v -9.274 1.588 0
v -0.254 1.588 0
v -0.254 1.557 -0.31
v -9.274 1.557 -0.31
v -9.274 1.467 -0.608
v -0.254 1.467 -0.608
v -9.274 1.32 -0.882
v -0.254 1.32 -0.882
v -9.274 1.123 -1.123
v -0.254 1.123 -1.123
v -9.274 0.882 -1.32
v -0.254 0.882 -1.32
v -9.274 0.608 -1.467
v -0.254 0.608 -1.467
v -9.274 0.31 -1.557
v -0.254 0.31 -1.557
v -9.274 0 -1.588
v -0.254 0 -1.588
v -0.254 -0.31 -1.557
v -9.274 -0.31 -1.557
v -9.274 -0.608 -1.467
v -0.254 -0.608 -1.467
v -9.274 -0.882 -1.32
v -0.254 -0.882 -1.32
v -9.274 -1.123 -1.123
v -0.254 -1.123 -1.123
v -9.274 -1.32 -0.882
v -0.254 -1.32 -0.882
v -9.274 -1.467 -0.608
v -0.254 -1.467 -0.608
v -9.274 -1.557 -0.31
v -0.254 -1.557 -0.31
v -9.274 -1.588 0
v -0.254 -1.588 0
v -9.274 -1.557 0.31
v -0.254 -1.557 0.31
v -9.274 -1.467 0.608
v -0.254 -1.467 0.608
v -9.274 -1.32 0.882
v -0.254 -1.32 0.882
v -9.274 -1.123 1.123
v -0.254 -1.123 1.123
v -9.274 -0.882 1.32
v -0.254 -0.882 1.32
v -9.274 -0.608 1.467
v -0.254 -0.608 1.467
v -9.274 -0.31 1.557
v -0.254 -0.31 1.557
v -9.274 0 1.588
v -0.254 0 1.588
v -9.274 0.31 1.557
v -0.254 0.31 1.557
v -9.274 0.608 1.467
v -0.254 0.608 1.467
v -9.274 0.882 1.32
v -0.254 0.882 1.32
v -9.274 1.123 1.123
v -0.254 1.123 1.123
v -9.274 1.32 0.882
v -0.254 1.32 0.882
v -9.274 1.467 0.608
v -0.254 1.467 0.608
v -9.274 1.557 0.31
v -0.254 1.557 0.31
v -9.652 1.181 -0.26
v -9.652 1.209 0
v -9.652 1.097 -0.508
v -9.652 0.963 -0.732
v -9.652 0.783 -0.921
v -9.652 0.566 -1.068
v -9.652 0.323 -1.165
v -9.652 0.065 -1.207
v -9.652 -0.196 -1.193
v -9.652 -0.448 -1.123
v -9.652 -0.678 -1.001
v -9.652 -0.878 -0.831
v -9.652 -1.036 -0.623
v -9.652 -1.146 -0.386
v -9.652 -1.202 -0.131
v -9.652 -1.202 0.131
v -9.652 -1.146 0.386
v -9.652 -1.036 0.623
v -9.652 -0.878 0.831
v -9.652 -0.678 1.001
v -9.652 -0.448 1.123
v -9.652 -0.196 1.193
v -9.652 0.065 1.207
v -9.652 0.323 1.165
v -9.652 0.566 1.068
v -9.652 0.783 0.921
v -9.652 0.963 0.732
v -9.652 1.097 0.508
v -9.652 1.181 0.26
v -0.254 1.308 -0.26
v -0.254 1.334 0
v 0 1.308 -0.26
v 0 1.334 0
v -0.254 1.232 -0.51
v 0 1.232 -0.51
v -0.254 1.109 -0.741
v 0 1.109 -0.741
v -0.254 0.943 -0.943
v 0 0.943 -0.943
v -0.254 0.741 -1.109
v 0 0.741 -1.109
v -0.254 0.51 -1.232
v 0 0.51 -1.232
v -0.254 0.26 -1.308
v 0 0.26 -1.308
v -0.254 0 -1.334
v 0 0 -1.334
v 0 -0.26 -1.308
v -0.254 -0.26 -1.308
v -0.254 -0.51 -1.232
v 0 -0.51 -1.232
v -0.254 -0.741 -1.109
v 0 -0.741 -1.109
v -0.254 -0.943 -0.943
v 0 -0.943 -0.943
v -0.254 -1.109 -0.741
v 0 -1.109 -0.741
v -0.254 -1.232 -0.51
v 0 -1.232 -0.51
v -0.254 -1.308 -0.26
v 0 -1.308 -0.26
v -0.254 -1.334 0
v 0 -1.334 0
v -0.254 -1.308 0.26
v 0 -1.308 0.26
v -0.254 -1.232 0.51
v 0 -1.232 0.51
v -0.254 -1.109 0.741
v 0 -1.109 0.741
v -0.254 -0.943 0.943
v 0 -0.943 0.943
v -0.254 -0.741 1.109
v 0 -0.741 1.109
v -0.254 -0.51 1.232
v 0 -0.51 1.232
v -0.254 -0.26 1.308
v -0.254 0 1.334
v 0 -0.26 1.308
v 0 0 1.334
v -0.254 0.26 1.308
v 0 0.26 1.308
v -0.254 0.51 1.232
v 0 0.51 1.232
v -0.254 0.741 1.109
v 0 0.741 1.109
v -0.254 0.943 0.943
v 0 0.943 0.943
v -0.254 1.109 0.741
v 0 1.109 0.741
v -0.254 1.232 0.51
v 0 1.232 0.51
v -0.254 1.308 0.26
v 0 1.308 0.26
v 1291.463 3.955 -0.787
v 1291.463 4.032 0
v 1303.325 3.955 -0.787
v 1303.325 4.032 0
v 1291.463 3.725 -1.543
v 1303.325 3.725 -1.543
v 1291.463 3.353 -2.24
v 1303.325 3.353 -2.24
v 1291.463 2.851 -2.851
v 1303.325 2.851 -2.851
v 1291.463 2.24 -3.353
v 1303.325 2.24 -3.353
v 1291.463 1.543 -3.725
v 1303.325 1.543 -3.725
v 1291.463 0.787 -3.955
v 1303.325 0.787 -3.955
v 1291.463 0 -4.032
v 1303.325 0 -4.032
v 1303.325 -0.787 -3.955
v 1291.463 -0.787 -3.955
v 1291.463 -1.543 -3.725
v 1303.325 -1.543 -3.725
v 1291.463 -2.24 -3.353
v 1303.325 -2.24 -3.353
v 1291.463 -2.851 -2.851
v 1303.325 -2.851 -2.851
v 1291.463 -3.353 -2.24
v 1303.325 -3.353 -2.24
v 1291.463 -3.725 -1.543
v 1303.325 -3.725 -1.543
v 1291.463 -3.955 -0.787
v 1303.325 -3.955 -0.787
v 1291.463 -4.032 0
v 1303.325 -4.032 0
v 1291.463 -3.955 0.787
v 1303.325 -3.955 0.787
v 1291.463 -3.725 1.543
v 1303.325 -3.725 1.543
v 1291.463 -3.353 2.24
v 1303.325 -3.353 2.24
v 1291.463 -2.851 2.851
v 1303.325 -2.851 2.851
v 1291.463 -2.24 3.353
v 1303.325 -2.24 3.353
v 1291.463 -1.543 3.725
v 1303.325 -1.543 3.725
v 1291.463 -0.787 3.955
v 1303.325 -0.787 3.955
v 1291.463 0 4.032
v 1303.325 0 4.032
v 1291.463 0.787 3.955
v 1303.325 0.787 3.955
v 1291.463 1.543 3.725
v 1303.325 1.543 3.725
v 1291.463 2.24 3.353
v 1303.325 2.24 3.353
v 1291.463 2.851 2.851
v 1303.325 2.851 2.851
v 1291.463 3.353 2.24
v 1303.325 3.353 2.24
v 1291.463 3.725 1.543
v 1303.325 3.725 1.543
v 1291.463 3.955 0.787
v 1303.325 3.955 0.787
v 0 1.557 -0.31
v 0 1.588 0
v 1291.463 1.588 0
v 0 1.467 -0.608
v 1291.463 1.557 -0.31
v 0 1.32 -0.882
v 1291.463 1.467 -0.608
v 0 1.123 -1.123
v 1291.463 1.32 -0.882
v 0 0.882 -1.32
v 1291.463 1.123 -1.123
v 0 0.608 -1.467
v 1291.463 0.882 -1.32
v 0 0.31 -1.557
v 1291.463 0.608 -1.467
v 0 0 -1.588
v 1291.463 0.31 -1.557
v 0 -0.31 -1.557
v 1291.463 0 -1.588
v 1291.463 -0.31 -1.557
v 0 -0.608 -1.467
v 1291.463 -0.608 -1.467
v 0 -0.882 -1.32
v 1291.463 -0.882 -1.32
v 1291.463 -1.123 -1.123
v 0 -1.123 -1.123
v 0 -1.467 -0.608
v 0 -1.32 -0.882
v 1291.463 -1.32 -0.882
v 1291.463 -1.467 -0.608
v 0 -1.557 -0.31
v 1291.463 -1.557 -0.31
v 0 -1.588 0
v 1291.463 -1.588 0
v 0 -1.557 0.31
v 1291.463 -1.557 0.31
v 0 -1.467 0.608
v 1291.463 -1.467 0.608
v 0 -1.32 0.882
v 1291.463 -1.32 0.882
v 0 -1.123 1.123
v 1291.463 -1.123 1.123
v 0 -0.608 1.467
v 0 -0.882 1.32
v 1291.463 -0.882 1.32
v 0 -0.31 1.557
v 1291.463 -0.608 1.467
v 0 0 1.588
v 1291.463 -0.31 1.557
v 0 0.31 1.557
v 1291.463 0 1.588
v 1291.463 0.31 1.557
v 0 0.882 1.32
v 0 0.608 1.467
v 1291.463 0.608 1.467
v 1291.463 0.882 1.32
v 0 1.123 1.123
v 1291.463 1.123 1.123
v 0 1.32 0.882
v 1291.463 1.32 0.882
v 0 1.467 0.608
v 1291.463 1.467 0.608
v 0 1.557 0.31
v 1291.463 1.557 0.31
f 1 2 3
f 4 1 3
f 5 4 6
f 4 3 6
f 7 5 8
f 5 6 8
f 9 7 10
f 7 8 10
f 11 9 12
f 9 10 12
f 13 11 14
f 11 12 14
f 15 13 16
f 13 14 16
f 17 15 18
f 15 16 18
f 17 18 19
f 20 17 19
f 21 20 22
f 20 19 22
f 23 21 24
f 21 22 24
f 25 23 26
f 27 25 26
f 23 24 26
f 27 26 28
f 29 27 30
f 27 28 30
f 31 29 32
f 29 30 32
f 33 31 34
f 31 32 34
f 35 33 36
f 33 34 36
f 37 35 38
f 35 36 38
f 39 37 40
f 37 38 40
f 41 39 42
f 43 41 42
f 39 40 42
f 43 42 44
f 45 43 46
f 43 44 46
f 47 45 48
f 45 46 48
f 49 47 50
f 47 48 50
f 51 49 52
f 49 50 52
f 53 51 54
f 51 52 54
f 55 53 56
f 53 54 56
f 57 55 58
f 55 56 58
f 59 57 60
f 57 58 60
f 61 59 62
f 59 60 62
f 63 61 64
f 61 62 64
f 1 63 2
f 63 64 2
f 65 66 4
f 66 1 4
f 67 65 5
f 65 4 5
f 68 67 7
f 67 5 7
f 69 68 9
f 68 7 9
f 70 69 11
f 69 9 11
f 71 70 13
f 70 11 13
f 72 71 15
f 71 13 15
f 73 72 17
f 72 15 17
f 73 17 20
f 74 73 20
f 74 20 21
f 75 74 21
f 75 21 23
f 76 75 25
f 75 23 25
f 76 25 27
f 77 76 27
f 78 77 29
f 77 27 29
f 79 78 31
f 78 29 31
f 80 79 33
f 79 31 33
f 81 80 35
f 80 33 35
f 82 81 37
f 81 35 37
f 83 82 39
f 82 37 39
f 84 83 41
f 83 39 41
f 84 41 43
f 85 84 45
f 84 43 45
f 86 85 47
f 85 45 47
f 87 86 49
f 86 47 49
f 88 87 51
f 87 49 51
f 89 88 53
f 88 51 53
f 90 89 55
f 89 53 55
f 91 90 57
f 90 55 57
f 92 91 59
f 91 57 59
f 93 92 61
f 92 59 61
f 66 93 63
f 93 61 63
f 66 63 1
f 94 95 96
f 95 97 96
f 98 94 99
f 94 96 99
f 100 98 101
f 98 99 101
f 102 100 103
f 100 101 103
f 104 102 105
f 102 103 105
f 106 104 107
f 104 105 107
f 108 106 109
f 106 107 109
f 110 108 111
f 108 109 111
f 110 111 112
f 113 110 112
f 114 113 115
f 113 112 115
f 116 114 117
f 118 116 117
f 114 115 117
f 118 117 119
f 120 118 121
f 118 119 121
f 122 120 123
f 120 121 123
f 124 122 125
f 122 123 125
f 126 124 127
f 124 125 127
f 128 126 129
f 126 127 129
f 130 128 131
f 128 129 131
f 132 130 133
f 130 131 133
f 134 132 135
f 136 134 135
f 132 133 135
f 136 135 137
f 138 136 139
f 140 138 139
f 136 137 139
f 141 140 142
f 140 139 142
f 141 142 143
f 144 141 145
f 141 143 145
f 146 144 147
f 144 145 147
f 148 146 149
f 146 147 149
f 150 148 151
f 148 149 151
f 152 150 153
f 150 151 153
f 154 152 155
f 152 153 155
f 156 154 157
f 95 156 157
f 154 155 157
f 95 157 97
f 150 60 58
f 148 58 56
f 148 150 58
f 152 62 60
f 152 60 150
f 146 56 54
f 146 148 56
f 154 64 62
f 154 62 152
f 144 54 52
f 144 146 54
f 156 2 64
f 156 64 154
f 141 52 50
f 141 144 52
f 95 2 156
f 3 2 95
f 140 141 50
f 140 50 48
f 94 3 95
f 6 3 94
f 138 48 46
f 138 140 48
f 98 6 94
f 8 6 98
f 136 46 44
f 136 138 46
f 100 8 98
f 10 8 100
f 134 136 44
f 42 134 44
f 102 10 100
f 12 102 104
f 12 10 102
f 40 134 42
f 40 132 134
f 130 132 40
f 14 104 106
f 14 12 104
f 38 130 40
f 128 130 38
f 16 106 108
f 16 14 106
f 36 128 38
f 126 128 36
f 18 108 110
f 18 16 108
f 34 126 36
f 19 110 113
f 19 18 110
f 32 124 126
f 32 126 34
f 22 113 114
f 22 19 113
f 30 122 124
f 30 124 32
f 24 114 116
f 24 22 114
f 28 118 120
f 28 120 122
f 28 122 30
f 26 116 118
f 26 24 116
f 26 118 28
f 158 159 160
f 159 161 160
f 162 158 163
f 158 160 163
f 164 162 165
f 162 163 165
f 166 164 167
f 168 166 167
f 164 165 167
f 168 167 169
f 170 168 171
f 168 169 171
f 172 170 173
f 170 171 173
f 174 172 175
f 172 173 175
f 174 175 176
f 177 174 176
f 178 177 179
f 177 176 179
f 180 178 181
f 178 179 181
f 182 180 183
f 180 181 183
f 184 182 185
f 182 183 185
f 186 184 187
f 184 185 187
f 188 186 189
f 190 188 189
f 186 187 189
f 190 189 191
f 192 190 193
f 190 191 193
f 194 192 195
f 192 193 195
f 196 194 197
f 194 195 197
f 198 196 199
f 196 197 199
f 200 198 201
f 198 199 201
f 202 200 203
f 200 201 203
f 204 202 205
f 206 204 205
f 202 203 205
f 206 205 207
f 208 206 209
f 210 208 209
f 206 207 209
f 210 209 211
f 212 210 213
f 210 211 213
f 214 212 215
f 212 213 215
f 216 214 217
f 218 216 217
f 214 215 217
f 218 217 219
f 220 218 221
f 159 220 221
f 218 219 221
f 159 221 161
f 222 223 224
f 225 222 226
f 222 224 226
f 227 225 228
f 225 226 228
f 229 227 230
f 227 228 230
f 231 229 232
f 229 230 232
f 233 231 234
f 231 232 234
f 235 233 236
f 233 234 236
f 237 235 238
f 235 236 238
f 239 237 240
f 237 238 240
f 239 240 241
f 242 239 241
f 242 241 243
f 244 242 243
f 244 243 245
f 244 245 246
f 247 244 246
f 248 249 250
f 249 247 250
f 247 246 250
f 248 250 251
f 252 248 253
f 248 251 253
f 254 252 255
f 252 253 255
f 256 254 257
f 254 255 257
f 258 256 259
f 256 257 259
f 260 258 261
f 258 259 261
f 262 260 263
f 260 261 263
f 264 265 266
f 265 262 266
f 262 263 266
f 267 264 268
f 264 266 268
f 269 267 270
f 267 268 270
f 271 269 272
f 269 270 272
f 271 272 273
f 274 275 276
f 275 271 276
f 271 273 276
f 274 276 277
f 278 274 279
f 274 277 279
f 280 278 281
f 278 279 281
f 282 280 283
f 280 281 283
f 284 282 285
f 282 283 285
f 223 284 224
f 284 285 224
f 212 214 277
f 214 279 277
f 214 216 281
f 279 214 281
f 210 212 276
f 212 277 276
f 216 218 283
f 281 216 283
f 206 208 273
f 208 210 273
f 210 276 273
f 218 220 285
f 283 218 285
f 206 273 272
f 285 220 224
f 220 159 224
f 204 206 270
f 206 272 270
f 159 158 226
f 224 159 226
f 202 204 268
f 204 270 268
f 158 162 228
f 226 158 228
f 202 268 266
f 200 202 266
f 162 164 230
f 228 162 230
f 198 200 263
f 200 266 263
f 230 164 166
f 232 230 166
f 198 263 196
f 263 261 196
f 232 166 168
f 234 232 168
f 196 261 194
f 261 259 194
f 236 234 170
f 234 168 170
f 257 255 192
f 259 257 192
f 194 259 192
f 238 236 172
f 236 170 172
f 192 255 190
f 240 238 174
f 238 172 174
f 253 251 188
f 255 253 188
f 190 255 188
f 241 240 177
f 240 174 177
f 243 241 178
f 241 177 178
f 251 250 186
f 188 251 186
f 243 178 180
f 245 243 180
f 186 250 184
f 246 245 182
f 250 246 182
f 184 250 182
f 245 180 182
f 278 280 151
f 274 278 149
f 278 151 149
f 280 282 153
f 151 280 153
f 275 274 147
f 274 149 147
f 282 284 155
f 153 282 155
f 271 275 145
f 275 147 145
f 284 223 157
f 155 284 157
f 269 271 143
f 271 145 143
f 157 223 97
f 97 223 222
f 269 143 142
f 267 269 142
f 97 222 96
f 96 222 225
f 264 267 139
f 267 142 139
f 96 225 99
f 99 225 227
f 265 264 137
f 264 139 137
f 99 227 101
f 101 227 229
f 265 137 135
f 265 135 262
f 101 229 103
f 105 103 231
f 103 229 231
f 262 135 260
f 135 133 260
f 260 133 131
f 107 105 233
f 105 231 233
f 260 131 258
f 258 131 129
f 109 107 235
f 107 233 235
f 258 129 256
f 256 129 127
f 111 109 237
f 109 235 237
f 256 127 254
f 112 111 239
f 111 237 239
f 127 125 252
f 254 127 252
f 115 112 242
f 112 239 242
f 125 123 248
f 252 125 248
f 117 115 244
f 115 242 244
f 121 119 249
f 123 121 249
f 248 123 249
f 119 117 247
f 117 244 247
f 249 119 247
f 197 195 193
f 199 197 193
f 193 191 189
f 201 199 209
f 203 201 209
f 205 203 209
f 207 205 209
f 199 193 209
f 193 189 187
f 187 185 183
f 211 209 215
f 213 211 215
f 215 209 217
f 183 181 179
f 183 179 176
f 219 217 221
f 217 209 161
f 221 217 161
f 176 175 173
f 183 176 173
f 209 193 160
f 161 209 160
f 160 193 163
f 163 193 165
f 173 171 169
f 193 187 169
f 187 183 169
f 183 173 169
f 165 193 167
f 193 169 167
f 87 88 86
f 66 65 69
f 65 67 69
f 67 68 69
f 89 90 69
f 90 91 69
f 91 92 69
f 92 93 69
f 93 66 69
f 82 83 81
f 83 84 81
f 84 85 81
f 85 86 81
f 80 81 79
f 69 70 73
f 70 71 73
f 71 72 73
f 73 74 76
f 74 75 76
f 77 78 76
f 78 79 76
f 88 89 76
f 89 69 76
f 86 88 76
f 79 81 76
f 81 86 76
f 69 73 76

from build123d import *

# Parameters (mm, degrees)
SKETCH3_W = 0.254
SKETCH3_H = 0.508


with BuildPart() as part:
    # Sketch1 → Revolve1 (revolve)
    with BuildSketch(Plane.XY):
        Polygon((0, 0), (0, 1.5875), (1291.463, 1.5875), (1291.463, 4.03225), (1303.3248, 4.03225), (1303.3248, 0), align=None)
    revolve(axis=Axis((1303.3248, 0, 0), (-1, 0, 0)))

    # Sketch2 → Revolve2 (revolve)
    with BuildSketch(Plane.XY):
        Polygon((-9.652, 0), (-9.652, 1.20904), (-9.27354, 1.5875), (0, 1.5875), (0, 0), align=None)
    revolve(axis=Axis((0, 0, 0), (-1, 0, 0)))

    # Sketch3 → Cut-Revolve1 (revolve, cut)
    with BuildSketch(Plane.XY):
        with Locations((-0.127, 1.5875)):
            Rectangle(SKETCH3_W, SKETCH3_H)
    revolve(axis=Axis((0, 0, 0), (-1, 0, 0)), mode=Mode.SUBTRACT)


solid = part.part
